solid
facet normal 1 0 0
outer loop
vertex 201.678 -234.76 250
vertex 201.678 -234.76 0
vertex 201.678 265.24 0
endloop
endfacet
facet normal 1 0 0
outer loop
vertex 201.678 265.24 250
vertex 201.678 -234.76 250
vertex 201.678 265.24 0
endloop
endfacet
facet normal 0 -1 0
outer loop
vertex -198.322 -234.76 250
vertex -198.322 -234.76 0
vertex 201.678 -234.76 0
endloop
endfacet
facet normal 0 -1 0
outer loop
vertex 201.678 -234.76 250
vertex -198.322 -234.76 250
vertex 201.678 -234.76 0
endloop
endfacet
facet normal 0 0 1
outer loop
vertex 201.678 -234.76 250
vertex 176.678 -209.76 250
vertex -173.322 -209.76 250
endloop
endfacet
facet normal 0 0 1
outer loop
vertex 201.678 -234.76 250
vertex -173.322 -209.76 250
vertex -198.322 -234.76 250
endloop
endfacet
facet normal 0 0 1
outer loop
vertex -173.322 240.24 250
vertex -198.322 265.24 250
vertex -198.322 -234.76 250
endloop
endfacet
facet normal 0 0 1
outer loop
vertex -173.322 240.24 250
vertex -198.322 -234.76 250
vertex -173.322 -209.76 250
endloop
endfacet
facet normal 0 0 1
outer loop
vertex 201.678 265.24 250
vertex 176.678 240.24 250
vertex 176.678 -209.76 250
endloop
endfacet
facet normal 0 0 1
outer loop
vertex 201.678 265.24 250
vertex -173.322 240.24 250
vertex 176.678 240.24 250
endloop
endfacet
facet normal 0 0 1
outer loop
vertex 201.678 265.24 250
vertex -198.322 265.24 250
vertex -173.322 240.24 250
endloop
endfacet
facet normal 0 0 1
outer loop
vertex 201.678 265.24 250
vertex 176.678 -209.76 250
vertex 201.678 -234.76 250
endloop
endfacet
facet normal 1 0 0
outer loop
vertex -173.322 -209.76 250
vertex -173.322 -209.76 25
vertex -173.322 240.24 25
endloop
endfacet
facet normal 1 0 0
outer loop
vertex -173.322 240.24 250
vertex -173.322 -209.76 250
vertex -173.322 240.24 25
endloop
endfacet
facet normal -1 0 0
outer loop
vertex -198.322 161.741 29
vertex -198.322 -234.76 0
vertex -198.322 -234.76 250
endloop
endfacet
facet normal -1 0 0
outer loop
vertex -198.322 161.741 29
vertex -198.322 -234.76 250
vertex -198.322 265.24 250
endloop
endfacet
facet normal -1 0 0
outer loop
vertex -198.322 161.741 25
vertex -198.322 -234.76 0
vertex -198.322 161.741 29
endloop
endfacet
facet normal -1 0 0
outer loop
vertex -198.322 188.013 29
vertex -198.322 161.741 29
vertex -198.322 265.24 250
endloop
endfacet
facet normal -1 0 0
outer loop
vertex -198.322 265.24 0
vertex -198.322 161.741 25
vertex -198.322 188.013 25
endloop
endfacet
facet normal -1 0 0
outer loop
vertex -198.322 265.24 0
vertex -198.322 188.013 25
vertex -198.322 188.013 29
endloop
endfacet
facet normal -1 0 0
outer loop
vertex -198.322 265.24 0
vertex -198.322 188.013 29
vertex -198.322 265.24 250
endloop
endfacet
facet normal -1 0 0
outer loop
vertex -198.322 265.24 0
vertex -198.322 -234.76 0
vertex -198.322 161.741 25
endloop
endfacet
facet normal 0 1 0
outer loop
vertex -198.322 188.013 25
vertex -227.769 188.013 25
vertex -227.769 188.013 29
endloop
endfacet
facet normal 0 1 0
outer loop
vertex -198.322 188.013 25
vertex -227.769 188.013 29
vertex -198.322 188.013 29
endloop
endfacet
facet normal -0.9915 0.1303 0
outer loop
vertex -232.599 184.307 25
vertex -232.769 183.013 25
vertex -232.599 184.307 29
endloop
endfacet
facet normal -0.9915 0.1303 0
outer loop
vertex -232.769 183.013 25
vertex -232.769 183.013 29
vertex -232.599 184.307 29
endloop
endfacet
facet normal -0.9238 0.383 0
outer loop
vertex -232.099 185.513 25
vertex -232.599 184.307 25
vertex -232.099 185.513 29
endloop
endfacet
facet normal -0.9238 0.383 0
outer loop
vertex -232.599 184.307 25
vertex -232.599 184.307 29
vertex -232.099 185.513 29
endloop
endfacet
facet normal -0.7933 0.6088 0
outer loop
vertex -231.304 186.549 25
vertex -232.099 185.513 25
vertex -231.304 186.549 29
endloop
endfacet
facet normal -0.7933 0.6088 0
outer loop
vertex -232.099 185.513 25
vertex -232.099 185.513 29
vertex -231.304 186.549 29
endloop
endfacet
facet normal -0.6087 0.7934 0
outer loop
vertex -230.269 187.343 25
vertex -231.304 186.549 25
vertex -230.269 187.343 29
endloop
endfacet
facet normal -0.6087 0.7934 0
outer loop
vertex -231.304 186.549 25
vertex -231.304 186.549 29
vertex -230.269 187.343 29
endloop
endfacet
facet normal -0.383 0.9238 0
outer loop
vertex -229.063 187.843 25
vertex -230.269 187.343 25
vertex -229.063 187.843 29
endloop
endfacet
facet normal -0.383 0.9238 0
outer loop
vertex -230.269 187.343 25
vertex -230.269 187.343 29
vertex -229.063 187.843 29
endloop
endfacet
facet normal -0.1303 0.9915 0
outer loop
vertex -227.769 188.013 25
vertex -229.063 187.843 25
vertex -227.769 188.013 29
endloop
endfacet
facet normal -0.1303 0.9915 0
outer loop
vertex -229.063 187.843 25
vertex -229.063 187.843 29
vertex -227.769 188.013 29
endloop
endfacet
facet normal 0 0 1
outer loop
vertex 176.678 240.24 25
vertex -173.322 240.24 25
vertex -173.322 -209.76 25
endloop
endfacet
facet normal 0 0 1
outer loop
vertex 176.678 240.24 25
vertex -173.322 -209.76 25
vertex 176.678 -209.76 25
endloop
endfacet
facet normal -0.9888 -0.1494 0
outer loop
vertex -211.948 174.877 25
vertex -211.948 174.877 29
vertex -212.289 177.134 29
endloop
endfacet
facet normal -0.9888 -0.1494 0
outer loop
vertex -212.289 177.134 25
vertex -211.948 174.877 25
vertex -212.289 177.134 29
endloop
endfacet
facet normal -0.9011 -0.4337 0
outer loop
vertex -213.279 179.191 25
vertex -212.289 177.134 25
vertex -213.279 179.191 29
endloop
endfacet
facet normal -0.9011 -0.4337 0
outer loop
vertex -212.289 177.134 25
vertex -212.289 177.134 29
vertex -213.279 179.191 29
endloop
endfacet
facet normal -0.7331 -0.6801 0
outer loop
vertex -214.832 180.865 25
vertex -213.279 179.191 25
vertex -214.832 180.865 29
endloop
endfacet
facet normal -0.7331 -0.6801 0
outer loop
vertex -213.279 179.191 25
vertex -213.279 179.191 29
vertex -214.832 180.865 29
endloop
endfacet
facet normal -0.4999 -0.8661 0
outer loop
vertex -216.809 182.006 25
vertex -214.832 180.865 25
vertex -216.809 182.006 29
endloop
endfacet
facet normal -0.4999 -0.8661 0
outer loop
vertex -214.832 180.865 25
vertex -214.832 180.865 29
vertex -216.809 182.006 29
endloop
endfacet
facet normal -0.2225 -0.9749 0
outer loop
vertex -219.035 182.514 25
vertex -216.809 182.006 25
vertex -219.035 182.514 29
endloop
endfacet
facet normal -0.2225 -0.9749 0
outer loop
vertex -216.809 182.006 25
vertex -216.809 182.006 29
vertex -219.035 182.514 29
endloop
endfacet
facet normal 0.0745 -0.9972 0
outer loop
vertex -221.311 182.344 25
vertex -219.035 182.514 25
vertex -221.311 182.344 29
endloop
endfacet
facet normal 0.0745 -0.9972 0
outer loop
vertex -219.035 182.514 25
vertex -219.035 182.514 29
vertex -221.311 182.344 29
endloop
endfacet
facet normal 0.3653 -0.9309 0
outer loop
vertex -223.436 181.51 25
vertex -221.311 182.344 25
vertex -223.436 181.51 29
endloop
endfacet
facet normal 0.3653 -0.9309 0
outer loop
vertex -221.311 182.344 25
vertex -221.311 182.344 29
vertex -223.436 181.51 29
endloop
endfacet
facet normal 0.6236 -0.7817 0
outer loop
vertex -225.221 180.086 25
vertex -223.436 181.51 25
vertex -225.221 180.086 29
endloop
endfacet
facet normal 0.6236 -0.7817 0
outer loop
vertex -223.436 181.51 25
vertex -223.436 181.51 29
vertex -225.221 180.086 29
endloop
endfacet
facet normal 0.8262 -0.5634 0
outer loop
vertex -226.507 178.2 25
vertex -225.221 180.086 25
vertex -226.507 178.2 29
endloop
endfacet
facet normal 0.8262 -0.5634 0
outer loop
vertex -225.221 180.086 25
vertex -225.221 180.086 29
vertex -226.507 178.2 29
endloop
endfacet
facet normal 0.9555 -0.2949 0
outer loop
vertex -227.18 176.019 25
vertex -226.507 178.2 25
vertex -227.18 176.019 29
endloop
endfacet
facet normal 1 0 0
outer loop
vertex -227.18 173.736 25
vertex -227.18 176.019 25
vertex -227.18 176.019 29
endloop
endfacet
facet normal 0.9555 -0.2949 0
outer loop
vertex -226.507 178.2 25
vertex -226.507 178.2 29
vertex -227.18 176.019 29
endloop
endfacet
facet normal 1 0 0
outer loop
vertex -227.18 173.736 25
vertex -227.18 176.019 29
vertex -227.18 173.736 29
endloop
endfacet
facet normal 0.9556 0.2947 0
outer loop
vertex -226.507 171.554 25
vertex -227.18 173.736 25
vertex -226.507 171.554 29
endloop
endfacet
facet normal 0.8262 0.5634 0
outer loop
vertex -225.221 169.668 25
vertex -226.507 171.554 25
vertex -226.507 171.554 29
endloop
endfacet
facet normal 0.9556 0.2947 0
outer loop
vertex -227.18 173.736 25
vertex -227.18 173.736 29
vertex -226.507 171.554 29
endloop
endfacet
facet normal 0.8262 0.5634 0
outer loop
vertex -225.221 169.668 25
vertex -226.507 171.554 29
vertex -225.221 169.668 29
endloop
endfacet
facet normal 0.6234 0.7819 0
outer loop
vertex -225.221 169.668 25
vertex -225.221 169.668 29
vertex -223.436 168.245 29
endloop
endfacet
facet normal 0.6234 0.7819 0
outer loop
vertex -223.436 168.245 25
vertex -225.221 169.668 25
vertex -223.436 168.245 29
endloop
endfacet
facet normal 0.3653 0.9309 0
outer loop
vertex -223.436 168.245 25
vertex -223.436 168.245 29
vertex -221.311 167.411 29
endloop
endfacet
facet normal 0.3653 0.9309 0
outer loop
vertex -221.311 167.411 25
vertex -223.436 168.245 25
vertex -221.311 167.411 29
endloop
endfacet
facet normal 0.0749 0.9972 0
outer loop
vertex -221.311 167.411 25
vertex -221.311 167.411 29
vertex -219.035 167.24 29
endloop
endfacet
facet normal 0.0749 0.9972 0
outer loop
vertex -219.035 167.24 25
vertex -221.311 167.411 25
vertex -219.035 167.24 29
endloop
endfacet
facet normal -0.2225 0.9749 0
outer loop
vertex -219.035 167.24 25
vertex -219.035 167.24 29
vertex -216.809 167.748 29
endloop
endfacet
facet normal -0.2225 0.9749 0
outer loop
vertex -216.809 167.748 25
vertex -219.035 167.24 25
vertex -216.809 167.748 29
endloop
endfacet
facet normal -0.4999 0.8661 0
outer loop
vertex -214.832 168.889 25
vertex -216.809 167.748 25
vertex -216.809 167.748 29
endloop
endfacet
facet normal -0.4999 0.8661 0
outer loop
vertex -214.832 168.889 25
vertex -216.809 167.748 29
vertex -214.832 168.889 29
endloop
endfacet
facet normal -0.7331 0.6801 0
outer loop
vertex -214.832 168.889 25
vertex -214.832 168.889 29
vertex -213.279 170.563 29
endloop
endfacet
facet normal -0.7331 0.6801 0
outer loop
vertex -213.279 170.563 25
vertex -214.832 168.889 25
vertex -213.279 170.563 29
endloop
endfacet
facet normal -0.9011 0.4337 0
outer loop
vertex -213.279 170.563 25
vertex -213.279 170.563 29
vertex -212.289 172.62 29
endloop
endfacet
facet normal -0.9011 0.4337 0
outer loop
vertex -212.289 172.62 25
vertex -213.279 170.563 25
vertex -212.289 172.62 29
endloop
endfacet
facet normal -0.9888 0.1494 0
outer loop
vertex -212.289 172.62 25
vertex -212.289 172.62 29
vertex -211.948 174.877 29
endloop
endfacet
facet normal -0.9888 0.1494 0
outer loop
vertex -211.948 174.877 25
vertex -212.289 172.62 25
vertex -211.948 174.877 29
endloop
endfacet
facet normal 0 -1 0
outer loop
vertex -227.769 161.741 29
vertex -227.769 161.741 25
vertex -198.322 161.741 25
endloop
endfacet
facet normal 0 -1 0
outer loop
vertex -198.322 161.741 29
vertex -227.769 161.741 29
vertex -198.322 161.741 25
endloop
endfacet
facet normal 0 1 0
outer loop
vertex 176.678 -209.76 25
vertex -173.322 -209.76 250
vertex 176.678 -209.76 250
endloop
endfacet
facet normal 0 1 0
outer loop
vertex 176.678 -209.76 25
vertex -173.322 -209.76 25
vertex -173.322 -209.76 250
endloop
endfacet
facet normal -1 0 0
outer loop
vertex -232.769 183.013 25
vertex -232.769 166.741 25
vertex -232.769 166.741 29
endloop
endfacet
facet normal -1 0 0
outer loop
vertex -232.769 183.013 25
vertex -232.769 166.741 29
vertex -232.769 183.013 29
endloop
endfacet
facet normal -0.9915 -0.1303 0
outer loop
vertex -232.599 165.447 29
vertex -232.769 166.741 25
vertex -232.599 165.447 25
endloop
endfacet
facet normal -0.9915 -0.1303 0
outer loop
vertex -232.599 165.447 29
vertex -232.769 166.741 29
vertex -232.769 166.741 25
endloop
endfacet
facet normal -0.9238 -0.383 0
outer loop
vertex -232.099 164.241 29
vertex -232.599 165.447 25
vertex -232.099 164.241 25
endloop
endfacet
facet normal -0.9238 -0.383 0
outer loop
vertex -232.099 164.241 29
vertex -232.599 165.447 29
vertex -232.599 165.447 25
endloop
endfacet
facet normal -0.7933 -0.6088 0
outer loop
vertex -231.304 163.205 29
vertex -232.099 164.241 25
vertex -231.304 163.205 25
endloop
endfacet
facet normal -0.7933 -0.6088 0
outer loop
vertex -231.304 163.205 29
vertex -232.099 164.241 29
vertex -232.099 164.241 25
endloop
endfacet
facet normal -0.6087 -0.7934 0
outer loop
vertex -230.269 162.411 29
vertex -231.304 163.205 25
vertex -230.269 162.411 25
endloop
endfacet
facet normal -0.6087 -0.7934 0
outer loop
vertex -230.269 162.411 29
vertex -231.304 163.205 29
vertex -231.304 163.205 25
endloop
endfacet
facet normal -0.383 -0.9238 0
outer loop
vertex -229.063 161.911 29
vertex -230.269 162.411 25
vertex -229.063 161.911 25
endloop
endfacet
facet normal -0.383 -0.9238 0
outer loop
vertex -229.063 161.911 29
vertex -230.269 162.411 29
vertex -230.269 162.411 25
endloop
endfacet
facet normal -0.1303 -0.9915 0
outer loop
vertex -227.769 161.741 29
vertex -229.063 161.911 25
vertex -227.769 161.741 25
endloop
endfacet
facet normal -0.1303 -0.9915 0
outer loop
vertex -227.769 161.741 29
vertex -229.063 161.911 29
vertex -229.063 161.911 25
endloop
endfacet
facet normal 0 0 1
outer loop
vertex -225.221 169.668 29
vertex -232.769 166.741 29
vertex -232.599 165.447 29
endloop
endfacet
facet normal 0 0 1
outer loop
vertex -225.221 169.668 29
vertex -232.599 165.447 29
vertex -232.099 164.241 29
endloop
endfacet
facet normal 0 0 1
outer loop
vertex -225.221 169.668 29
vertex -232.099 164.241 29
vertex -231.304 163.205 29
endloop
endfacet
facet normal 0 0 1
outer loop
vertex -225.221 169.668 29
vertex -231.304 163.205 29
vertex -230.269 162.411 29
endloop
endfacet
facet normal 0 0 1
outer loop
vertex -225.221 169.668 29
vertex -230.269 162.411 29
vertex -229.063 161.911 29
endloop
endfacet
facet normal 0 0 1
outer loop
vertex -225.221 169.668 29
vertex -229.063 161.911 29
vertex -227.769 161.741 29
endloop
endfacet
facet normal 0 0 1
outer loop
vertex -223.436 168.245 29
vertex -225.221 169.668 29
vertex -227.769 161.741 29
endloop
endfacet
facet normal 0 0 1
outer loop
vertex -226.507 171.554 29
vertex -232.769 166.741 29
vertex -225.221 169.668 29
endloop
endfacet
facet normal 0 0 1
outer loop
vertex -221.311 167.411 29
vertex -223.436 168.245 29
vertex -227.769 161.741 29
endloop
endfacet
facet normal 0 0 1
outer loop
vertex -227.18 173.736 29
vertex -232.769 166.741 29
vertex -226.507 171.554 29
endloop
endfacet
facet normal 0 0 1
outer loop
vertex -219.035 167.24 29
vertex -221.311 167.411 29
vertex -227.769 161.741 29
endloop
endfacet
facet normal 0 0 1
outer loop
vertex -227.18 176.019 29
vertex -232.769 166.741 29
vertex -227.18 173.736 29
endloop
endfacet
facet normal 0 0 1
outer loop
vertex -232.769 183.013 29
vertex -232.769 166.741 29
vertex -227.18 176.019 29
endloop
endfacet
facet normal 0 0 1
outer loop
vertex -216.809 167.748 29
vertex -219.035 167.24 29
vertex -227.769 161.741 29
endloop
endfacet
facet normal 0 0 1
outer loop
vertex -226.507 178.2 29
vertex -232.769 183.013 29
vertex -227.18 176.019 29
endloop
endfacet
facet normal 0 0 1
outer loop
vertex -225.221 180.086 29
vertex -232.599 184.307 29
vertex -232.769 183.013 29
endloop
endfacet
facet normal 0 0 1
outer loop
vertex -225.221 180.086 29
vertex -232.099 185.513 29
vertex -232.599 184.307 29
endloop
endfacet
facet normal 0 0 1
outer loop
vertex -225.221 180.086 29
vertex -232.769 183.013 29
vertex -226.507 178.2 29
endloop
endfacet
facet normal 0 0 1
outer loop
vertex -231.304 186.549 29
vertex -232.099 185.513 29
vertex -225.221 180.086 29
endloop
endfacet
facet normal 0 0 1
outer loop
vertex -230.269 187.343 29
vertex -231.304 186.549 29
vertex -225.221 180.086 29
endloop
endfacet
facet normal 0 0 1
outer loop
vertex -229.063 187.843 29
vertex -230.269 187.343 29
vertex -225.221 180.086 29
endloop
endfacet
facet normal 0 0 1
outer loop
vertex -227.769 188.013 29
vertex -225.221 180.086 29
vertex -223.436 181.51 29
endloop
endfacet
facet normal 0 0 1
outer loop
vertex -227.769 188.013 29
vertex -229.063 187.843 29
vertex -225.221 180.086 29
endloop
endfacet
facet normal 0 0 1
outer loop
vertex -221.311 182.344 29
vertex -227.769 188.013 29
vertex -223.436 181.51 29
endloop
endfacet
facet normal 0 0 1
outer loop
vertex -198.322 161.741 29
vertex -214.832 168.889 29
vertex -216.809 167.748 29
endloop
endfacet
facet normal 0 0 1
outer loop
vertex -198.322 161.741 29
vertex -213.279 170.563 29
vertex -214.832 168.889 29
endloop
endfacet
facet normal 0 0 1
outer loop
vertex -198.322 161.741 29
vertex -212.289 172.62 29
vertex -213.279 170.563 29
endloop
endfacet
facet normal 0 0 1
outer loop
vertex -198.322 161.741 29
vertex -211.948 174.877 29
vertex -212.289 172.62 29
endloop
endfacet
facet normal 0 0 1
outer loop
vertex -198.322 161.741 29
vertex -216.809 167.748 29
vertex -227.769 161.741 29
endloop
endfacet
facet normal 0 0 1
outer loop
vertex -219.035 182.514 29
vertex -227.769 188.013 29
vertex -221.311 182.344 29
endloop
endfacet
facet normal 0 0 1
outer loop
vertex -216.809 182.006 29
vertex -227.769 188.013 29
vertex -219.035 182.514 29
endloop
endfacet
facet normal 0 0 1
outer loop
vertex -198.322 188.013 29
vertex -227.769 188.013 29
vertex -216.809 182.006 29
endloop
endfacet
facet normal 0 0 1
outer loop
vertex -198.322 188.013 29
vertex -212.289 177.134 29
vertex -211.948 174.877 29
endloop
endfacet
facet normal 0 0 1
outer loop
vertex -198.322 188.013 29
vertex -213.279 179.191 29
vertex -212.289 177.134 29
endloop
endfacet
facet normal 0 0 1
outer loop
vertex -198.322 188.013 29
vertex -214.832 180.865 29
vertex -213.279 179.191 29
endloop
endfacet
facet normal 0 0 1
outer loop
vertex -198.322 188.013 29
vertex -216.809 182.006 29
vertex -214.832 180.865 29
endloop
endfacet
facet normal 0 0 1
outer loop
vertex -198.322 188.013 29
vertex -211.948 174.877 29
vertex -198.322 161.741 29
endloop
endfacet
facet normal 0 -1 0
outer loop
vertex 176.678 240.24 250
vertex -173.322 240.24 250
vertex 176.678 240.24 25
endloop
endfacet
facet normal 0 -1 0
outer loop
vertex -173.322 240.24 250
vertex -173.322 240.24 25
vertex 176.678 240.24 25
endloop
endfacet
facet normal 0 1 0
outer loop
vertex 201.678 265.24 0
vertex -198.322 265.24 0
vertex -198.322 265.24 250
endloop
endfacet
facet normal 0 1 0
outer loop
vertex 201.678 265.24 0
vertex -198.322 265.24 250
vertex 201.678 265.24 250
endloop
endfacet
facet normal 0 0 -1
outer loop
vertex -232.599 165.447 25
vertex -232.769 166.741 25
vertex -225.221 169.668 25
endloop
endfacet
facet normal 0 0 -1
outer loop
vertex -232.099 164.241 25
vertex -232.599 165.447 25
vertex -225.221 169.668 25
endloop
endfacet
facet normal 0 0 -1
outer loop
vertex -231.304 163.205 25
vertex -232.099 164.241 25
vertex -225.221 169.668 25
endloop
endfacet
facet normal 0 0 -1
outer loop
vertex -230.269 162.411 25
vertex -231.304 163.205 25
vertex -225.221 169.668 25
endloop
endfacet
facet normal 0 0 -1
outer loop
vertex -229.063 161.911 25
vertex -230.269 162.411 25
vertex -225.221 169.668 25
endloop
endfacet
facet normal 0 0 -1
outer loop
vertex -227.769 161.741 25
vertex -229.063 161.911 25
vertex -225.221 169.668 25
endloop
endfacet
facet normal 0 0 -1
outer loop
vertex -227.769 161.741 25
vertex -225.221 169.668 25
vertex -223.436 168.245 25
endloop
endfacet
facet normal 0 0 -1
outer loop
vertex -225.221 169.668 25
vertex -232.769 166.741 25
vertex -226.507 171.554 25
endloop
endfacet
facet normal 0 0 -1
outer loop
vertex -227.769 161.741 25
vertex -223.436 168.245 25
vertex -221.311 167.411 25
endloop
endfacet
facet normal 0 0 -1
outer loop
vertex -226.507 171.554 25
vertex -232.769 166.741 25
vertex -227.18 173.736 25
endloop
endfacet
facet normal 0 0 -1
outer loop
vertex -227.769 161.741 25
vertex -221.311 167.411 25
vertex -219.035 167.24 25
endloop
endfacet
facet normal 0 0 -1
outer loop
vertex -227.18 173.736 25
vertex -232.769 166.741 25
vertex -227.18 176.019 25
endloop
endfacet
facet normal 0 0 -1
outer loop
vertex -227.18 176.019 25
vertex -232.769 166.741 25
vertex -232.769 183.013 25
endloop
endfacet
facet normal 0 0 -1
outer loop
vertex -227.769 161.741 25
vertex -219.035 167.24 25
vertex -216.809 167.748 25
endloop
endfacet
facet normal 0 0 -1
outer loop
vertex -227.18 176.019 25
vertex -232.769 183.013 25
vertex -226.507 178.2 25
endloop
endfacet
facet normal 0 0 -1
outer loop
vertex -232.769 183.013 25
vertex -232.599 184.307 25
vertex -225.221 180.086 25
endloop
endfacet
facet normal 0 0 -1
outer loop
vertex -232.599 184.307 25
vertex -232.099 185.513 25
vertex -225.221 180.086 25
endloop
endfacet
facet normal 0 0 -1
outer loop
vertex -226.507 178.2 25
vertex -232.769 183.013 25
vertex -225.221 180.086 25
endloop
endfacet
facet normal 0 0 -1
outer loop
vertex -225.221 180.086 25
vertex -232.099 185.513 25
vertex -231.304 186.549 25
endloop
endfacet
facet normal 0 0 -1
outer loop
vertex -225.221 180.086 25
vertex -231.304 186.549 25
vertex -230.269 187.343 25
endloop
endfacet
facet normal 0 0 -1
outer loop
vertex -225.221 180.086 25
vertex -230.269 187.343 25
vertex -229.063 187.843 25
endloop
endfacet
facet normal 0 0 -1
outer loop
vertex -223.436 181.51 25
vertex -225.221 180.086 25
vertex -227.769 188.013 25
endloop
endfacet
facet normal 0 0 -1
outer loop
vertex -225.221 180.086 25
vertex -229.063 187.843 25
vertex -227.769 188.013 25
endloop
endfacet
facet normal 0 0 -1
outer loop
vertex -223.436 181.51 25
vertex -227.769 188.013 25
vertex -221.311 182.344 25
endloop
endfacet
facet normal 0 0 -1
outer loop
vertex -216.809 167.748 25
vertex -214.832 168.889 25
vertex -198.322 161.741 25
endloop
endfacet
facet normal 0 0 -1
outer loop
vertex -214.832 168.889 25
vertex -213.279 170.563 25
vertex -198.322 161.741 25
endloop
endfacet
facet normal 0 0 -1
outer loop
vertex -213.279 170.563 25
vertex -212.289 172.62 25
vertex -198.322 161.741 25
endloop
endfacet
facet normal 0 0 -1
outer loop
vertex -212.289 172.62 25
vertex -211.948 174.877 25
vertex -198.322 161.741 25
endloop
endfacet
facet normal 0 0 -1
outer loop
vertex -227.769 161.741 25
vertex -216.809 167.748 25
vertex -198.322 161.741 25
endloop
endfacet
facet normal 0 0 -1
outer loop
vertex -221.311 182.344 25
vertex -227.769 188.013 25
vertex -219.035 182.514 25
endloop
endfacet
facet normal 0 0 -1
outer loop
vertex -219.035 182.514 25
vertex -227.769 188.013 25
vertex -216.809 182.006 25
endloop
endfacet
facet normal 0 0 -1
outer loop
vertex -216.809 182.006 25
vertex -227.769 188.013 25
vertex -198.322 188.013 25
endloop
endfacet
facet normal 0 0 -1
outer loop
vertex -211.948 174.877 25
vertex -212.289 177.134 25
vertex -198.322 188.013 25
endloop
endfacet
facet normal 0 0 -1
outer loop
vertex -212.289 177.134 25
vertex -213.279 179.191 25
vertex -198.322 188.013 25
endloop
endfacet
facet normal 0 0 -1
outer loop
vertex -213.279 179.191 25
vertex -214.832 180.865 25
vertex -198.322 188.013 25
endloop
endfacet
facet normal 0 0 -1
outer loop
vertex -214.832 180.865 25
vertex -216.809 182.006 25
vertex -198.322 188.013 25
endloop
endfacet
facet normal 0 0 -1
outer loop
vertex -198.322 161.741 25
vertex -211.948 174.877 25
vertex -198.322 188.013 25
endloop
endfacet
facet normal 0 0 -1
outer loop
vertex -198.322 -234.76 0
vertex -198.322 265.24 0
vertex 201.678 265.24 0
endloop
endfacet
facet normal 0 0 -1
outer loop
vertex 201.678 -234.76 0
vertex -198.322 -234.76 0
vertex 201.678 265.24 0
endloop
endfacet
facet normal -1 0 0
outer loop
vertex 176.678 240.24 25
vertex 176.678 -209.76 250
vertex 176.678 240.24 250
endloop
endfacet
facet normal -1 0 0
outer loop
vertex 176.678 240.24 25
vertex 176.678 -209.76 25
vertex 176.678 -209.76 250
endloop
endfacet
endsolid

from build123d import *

# Parameters (mm, degrees)
F0_W     = 400
F0_H     = 500
F1_DEPTH = 250
F2_T     = -25
F3_W     = 59.44657
F3_H     = 26.272267
F4_DEPTH = 4
F5_R     = 5
F6_R     = 7.658555
F7_DEPTH = 25


with BuildPart() as f1:
    # F0 (on Top) → F1 (new body)
    with BuildSketch(Plane.XY):
        with Locations((1.677677, 15.239688)):
            Rectangle(F0_W, F0_H)
    extrude(amount=F1_DEPTH)

    # F2
    f2_openings = [f1.faces().sort_by_distance(p)[0] for p in [
        (1.677677, 15.239688, 250),
    ]]
    offset(amount=F2_T, openings=f2_openings)

    # F3 (on face) → F4 (join)
    with BuildSketch(Plane.XY.offset(25)):
        with Locations((-203.045608, 174.877093)):
            Rectangle(F3_W, F3_H)
    extrude(amount=F4_DEPTH)

    # F5
    f5_edges = [f1.edges().sort_by_distance(p)[0] for p in [
        (-232.768893, 161.740959, 27),
        (-232.768893, 188.013226, 27),
    ]]
    fillet(f5_edges, radius=F5_R)

    # F6 (on face) → F7 (cut)
    with BuildSketch(Plane.XY.offset(29)):
        with Locations((-219.607025, 174.877092)):
            Circle(F6_R)
    extrude(amount=-F7_DEPTH, mode=Mode.SUBTRACT)


solid = f1.part
